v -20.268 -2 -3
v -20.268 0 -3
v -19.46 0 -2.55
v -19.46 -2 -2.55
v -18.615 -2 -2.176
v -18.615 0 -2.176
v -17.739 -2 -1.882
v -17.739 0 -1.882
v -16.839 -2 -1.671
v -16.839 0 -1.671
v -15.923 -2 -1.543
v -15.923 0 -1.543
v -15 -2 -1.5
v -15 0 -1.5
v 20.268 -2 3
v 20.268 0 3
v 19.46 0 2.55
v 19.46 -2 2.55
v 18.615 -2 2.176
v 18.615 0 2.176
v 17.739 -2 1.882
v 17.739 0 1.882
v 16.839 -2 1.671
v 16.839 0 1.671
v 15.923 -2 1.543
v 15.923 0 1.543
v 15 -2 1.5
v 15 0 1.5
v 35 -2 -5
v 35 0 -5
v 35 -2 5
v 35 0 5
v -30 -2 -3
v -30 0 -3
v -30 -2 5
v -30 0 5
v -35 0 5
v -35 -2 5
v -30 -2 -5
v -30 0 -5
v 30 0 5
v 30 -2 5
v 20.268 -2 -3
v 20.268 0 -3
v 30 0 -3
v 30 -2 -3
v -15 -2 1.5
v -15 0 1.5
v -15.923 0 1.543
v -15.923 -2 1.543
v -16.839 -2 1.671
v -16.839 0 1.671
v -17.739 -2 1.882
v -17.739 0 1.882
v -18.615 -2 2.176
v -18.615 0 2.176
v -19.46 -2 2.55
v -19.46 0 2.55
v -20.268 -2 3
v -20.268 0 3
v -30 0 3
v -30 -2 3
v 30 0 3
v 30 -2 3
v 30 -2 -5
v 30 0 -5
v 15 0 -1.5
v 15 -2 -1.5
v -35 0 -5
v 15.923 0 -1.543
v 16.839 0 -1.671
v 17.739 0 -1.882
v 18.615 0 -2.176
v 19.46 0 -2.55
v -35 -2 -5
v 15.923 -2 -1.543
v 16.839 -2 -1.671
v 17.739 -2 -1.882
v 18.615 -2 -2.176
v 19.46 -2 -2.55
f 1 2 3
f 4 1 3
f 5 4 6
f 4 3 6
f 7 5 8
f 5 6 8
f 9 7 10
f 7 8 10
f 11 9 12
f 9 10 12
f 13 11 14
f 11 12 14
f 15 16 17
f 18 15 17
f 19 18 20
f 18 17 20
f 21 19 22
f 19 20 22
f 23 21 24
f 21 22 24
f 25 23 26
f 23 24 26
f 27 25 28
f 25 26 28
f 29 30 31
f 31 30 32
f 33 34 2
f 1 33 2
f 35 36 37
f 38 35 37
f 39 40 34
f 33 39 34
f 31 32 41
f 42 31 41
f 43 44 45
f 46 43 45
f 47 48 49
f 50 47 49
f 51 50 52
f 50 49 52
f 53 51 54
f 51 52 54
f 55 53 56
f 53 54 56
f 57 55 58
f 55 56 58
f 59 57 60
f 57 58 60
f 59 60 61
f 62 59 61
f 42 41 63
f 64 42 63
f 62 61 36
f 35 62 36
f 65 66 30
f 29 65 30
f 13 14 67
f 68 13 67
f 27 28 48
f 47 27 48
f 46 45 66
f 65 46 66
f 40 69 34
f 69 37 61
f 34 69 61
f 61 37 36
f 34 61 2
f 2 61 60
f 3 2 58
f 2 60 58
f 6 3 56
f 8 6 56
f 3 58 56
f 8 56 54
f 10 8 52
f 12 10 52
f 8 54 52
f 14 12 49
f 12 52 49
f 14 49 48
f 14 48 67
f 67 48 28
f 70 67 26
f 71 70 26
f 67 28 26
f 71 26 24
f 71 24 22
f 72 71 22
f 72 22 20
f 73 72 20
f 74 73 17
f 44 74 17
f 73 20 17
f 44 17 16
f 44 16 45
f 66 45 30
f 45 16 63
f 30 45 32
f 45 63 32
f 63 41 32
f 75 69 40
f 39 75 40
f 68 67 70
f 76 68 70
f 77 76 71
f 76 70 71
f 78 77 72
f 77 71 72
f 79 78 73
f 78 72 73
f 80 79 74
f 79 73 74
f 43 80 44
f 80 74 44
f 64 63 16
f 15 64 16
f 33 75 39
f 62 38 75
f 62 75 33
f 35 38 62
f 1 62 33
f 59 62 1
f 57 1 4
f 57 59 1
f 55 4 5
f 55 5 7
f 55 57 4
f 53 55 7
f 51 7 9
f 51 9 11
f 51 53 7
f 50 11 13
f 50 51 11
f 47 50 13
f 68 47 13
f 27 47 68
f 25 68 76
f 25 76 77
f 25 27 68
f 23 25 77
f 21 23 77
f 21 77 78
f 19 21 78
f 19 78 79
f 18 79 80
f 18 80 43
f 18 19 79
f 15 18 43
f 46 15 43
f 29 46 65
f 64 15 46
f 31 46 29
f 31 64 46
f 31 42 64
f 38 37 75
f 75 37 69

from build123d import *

# Parameters (mm, degrees)
F1_DEPTH = 2


with BuildPart() as f1:
    # F0 (on Front) → F1 (new body)
    with BuildSketch(Plane.XZ):
        with BuildLine():
            Line((-30, 5), (-35, 5))
            Line((-35, 5), (-35, 1.5))
            Line((-35, 1.5), (-35, -1.5))
            Line((-35, -1.5), (-35, -5))
            Line((-35, -5), (-30, -5))
            Line((-30, -5), (-30, -3))
            Line((-30, -3), (-20.267827, -3))
            ThreePointArc((-20.267827, -3), (-17.738613, -1.882308), (-15, -1.5))
            Line((-15, -1.5), (15, -1.5))
            ThreePointArc((15, -1.5), (17.738613, -1.882308), (20.267827, -3))
            Line((20.267827, -3), (30, -3))
            Line((30, -3), (30, -5))
            Line((30, -5), (35, -5))
            Line((35, -5), (35, -1.5))
            Line((35, -1.5), (35, 1.5))
            Line((35, 1.5), (35, 5))
            Line((35, 5), (30, 5))
            Line((30, 5), (30, 3))
            Line((30, 3), (20.267827, 3))
            ThreePointArc((20.267827, 3), (17.738613, 1.882308), (15, 1.5))
            Line((15, 1.5), (-15, 1.5))
            ThreePointArc((-15, 1.5), (-17.738613, 1.882308), (-20.267827, 3))
            Line((-20.267827, 3), (-30, 3))
            Line((-30, 3), (-30, 5))
        make_face()
    extrude(amount=F1_DEPTH)


solid = f1.part
